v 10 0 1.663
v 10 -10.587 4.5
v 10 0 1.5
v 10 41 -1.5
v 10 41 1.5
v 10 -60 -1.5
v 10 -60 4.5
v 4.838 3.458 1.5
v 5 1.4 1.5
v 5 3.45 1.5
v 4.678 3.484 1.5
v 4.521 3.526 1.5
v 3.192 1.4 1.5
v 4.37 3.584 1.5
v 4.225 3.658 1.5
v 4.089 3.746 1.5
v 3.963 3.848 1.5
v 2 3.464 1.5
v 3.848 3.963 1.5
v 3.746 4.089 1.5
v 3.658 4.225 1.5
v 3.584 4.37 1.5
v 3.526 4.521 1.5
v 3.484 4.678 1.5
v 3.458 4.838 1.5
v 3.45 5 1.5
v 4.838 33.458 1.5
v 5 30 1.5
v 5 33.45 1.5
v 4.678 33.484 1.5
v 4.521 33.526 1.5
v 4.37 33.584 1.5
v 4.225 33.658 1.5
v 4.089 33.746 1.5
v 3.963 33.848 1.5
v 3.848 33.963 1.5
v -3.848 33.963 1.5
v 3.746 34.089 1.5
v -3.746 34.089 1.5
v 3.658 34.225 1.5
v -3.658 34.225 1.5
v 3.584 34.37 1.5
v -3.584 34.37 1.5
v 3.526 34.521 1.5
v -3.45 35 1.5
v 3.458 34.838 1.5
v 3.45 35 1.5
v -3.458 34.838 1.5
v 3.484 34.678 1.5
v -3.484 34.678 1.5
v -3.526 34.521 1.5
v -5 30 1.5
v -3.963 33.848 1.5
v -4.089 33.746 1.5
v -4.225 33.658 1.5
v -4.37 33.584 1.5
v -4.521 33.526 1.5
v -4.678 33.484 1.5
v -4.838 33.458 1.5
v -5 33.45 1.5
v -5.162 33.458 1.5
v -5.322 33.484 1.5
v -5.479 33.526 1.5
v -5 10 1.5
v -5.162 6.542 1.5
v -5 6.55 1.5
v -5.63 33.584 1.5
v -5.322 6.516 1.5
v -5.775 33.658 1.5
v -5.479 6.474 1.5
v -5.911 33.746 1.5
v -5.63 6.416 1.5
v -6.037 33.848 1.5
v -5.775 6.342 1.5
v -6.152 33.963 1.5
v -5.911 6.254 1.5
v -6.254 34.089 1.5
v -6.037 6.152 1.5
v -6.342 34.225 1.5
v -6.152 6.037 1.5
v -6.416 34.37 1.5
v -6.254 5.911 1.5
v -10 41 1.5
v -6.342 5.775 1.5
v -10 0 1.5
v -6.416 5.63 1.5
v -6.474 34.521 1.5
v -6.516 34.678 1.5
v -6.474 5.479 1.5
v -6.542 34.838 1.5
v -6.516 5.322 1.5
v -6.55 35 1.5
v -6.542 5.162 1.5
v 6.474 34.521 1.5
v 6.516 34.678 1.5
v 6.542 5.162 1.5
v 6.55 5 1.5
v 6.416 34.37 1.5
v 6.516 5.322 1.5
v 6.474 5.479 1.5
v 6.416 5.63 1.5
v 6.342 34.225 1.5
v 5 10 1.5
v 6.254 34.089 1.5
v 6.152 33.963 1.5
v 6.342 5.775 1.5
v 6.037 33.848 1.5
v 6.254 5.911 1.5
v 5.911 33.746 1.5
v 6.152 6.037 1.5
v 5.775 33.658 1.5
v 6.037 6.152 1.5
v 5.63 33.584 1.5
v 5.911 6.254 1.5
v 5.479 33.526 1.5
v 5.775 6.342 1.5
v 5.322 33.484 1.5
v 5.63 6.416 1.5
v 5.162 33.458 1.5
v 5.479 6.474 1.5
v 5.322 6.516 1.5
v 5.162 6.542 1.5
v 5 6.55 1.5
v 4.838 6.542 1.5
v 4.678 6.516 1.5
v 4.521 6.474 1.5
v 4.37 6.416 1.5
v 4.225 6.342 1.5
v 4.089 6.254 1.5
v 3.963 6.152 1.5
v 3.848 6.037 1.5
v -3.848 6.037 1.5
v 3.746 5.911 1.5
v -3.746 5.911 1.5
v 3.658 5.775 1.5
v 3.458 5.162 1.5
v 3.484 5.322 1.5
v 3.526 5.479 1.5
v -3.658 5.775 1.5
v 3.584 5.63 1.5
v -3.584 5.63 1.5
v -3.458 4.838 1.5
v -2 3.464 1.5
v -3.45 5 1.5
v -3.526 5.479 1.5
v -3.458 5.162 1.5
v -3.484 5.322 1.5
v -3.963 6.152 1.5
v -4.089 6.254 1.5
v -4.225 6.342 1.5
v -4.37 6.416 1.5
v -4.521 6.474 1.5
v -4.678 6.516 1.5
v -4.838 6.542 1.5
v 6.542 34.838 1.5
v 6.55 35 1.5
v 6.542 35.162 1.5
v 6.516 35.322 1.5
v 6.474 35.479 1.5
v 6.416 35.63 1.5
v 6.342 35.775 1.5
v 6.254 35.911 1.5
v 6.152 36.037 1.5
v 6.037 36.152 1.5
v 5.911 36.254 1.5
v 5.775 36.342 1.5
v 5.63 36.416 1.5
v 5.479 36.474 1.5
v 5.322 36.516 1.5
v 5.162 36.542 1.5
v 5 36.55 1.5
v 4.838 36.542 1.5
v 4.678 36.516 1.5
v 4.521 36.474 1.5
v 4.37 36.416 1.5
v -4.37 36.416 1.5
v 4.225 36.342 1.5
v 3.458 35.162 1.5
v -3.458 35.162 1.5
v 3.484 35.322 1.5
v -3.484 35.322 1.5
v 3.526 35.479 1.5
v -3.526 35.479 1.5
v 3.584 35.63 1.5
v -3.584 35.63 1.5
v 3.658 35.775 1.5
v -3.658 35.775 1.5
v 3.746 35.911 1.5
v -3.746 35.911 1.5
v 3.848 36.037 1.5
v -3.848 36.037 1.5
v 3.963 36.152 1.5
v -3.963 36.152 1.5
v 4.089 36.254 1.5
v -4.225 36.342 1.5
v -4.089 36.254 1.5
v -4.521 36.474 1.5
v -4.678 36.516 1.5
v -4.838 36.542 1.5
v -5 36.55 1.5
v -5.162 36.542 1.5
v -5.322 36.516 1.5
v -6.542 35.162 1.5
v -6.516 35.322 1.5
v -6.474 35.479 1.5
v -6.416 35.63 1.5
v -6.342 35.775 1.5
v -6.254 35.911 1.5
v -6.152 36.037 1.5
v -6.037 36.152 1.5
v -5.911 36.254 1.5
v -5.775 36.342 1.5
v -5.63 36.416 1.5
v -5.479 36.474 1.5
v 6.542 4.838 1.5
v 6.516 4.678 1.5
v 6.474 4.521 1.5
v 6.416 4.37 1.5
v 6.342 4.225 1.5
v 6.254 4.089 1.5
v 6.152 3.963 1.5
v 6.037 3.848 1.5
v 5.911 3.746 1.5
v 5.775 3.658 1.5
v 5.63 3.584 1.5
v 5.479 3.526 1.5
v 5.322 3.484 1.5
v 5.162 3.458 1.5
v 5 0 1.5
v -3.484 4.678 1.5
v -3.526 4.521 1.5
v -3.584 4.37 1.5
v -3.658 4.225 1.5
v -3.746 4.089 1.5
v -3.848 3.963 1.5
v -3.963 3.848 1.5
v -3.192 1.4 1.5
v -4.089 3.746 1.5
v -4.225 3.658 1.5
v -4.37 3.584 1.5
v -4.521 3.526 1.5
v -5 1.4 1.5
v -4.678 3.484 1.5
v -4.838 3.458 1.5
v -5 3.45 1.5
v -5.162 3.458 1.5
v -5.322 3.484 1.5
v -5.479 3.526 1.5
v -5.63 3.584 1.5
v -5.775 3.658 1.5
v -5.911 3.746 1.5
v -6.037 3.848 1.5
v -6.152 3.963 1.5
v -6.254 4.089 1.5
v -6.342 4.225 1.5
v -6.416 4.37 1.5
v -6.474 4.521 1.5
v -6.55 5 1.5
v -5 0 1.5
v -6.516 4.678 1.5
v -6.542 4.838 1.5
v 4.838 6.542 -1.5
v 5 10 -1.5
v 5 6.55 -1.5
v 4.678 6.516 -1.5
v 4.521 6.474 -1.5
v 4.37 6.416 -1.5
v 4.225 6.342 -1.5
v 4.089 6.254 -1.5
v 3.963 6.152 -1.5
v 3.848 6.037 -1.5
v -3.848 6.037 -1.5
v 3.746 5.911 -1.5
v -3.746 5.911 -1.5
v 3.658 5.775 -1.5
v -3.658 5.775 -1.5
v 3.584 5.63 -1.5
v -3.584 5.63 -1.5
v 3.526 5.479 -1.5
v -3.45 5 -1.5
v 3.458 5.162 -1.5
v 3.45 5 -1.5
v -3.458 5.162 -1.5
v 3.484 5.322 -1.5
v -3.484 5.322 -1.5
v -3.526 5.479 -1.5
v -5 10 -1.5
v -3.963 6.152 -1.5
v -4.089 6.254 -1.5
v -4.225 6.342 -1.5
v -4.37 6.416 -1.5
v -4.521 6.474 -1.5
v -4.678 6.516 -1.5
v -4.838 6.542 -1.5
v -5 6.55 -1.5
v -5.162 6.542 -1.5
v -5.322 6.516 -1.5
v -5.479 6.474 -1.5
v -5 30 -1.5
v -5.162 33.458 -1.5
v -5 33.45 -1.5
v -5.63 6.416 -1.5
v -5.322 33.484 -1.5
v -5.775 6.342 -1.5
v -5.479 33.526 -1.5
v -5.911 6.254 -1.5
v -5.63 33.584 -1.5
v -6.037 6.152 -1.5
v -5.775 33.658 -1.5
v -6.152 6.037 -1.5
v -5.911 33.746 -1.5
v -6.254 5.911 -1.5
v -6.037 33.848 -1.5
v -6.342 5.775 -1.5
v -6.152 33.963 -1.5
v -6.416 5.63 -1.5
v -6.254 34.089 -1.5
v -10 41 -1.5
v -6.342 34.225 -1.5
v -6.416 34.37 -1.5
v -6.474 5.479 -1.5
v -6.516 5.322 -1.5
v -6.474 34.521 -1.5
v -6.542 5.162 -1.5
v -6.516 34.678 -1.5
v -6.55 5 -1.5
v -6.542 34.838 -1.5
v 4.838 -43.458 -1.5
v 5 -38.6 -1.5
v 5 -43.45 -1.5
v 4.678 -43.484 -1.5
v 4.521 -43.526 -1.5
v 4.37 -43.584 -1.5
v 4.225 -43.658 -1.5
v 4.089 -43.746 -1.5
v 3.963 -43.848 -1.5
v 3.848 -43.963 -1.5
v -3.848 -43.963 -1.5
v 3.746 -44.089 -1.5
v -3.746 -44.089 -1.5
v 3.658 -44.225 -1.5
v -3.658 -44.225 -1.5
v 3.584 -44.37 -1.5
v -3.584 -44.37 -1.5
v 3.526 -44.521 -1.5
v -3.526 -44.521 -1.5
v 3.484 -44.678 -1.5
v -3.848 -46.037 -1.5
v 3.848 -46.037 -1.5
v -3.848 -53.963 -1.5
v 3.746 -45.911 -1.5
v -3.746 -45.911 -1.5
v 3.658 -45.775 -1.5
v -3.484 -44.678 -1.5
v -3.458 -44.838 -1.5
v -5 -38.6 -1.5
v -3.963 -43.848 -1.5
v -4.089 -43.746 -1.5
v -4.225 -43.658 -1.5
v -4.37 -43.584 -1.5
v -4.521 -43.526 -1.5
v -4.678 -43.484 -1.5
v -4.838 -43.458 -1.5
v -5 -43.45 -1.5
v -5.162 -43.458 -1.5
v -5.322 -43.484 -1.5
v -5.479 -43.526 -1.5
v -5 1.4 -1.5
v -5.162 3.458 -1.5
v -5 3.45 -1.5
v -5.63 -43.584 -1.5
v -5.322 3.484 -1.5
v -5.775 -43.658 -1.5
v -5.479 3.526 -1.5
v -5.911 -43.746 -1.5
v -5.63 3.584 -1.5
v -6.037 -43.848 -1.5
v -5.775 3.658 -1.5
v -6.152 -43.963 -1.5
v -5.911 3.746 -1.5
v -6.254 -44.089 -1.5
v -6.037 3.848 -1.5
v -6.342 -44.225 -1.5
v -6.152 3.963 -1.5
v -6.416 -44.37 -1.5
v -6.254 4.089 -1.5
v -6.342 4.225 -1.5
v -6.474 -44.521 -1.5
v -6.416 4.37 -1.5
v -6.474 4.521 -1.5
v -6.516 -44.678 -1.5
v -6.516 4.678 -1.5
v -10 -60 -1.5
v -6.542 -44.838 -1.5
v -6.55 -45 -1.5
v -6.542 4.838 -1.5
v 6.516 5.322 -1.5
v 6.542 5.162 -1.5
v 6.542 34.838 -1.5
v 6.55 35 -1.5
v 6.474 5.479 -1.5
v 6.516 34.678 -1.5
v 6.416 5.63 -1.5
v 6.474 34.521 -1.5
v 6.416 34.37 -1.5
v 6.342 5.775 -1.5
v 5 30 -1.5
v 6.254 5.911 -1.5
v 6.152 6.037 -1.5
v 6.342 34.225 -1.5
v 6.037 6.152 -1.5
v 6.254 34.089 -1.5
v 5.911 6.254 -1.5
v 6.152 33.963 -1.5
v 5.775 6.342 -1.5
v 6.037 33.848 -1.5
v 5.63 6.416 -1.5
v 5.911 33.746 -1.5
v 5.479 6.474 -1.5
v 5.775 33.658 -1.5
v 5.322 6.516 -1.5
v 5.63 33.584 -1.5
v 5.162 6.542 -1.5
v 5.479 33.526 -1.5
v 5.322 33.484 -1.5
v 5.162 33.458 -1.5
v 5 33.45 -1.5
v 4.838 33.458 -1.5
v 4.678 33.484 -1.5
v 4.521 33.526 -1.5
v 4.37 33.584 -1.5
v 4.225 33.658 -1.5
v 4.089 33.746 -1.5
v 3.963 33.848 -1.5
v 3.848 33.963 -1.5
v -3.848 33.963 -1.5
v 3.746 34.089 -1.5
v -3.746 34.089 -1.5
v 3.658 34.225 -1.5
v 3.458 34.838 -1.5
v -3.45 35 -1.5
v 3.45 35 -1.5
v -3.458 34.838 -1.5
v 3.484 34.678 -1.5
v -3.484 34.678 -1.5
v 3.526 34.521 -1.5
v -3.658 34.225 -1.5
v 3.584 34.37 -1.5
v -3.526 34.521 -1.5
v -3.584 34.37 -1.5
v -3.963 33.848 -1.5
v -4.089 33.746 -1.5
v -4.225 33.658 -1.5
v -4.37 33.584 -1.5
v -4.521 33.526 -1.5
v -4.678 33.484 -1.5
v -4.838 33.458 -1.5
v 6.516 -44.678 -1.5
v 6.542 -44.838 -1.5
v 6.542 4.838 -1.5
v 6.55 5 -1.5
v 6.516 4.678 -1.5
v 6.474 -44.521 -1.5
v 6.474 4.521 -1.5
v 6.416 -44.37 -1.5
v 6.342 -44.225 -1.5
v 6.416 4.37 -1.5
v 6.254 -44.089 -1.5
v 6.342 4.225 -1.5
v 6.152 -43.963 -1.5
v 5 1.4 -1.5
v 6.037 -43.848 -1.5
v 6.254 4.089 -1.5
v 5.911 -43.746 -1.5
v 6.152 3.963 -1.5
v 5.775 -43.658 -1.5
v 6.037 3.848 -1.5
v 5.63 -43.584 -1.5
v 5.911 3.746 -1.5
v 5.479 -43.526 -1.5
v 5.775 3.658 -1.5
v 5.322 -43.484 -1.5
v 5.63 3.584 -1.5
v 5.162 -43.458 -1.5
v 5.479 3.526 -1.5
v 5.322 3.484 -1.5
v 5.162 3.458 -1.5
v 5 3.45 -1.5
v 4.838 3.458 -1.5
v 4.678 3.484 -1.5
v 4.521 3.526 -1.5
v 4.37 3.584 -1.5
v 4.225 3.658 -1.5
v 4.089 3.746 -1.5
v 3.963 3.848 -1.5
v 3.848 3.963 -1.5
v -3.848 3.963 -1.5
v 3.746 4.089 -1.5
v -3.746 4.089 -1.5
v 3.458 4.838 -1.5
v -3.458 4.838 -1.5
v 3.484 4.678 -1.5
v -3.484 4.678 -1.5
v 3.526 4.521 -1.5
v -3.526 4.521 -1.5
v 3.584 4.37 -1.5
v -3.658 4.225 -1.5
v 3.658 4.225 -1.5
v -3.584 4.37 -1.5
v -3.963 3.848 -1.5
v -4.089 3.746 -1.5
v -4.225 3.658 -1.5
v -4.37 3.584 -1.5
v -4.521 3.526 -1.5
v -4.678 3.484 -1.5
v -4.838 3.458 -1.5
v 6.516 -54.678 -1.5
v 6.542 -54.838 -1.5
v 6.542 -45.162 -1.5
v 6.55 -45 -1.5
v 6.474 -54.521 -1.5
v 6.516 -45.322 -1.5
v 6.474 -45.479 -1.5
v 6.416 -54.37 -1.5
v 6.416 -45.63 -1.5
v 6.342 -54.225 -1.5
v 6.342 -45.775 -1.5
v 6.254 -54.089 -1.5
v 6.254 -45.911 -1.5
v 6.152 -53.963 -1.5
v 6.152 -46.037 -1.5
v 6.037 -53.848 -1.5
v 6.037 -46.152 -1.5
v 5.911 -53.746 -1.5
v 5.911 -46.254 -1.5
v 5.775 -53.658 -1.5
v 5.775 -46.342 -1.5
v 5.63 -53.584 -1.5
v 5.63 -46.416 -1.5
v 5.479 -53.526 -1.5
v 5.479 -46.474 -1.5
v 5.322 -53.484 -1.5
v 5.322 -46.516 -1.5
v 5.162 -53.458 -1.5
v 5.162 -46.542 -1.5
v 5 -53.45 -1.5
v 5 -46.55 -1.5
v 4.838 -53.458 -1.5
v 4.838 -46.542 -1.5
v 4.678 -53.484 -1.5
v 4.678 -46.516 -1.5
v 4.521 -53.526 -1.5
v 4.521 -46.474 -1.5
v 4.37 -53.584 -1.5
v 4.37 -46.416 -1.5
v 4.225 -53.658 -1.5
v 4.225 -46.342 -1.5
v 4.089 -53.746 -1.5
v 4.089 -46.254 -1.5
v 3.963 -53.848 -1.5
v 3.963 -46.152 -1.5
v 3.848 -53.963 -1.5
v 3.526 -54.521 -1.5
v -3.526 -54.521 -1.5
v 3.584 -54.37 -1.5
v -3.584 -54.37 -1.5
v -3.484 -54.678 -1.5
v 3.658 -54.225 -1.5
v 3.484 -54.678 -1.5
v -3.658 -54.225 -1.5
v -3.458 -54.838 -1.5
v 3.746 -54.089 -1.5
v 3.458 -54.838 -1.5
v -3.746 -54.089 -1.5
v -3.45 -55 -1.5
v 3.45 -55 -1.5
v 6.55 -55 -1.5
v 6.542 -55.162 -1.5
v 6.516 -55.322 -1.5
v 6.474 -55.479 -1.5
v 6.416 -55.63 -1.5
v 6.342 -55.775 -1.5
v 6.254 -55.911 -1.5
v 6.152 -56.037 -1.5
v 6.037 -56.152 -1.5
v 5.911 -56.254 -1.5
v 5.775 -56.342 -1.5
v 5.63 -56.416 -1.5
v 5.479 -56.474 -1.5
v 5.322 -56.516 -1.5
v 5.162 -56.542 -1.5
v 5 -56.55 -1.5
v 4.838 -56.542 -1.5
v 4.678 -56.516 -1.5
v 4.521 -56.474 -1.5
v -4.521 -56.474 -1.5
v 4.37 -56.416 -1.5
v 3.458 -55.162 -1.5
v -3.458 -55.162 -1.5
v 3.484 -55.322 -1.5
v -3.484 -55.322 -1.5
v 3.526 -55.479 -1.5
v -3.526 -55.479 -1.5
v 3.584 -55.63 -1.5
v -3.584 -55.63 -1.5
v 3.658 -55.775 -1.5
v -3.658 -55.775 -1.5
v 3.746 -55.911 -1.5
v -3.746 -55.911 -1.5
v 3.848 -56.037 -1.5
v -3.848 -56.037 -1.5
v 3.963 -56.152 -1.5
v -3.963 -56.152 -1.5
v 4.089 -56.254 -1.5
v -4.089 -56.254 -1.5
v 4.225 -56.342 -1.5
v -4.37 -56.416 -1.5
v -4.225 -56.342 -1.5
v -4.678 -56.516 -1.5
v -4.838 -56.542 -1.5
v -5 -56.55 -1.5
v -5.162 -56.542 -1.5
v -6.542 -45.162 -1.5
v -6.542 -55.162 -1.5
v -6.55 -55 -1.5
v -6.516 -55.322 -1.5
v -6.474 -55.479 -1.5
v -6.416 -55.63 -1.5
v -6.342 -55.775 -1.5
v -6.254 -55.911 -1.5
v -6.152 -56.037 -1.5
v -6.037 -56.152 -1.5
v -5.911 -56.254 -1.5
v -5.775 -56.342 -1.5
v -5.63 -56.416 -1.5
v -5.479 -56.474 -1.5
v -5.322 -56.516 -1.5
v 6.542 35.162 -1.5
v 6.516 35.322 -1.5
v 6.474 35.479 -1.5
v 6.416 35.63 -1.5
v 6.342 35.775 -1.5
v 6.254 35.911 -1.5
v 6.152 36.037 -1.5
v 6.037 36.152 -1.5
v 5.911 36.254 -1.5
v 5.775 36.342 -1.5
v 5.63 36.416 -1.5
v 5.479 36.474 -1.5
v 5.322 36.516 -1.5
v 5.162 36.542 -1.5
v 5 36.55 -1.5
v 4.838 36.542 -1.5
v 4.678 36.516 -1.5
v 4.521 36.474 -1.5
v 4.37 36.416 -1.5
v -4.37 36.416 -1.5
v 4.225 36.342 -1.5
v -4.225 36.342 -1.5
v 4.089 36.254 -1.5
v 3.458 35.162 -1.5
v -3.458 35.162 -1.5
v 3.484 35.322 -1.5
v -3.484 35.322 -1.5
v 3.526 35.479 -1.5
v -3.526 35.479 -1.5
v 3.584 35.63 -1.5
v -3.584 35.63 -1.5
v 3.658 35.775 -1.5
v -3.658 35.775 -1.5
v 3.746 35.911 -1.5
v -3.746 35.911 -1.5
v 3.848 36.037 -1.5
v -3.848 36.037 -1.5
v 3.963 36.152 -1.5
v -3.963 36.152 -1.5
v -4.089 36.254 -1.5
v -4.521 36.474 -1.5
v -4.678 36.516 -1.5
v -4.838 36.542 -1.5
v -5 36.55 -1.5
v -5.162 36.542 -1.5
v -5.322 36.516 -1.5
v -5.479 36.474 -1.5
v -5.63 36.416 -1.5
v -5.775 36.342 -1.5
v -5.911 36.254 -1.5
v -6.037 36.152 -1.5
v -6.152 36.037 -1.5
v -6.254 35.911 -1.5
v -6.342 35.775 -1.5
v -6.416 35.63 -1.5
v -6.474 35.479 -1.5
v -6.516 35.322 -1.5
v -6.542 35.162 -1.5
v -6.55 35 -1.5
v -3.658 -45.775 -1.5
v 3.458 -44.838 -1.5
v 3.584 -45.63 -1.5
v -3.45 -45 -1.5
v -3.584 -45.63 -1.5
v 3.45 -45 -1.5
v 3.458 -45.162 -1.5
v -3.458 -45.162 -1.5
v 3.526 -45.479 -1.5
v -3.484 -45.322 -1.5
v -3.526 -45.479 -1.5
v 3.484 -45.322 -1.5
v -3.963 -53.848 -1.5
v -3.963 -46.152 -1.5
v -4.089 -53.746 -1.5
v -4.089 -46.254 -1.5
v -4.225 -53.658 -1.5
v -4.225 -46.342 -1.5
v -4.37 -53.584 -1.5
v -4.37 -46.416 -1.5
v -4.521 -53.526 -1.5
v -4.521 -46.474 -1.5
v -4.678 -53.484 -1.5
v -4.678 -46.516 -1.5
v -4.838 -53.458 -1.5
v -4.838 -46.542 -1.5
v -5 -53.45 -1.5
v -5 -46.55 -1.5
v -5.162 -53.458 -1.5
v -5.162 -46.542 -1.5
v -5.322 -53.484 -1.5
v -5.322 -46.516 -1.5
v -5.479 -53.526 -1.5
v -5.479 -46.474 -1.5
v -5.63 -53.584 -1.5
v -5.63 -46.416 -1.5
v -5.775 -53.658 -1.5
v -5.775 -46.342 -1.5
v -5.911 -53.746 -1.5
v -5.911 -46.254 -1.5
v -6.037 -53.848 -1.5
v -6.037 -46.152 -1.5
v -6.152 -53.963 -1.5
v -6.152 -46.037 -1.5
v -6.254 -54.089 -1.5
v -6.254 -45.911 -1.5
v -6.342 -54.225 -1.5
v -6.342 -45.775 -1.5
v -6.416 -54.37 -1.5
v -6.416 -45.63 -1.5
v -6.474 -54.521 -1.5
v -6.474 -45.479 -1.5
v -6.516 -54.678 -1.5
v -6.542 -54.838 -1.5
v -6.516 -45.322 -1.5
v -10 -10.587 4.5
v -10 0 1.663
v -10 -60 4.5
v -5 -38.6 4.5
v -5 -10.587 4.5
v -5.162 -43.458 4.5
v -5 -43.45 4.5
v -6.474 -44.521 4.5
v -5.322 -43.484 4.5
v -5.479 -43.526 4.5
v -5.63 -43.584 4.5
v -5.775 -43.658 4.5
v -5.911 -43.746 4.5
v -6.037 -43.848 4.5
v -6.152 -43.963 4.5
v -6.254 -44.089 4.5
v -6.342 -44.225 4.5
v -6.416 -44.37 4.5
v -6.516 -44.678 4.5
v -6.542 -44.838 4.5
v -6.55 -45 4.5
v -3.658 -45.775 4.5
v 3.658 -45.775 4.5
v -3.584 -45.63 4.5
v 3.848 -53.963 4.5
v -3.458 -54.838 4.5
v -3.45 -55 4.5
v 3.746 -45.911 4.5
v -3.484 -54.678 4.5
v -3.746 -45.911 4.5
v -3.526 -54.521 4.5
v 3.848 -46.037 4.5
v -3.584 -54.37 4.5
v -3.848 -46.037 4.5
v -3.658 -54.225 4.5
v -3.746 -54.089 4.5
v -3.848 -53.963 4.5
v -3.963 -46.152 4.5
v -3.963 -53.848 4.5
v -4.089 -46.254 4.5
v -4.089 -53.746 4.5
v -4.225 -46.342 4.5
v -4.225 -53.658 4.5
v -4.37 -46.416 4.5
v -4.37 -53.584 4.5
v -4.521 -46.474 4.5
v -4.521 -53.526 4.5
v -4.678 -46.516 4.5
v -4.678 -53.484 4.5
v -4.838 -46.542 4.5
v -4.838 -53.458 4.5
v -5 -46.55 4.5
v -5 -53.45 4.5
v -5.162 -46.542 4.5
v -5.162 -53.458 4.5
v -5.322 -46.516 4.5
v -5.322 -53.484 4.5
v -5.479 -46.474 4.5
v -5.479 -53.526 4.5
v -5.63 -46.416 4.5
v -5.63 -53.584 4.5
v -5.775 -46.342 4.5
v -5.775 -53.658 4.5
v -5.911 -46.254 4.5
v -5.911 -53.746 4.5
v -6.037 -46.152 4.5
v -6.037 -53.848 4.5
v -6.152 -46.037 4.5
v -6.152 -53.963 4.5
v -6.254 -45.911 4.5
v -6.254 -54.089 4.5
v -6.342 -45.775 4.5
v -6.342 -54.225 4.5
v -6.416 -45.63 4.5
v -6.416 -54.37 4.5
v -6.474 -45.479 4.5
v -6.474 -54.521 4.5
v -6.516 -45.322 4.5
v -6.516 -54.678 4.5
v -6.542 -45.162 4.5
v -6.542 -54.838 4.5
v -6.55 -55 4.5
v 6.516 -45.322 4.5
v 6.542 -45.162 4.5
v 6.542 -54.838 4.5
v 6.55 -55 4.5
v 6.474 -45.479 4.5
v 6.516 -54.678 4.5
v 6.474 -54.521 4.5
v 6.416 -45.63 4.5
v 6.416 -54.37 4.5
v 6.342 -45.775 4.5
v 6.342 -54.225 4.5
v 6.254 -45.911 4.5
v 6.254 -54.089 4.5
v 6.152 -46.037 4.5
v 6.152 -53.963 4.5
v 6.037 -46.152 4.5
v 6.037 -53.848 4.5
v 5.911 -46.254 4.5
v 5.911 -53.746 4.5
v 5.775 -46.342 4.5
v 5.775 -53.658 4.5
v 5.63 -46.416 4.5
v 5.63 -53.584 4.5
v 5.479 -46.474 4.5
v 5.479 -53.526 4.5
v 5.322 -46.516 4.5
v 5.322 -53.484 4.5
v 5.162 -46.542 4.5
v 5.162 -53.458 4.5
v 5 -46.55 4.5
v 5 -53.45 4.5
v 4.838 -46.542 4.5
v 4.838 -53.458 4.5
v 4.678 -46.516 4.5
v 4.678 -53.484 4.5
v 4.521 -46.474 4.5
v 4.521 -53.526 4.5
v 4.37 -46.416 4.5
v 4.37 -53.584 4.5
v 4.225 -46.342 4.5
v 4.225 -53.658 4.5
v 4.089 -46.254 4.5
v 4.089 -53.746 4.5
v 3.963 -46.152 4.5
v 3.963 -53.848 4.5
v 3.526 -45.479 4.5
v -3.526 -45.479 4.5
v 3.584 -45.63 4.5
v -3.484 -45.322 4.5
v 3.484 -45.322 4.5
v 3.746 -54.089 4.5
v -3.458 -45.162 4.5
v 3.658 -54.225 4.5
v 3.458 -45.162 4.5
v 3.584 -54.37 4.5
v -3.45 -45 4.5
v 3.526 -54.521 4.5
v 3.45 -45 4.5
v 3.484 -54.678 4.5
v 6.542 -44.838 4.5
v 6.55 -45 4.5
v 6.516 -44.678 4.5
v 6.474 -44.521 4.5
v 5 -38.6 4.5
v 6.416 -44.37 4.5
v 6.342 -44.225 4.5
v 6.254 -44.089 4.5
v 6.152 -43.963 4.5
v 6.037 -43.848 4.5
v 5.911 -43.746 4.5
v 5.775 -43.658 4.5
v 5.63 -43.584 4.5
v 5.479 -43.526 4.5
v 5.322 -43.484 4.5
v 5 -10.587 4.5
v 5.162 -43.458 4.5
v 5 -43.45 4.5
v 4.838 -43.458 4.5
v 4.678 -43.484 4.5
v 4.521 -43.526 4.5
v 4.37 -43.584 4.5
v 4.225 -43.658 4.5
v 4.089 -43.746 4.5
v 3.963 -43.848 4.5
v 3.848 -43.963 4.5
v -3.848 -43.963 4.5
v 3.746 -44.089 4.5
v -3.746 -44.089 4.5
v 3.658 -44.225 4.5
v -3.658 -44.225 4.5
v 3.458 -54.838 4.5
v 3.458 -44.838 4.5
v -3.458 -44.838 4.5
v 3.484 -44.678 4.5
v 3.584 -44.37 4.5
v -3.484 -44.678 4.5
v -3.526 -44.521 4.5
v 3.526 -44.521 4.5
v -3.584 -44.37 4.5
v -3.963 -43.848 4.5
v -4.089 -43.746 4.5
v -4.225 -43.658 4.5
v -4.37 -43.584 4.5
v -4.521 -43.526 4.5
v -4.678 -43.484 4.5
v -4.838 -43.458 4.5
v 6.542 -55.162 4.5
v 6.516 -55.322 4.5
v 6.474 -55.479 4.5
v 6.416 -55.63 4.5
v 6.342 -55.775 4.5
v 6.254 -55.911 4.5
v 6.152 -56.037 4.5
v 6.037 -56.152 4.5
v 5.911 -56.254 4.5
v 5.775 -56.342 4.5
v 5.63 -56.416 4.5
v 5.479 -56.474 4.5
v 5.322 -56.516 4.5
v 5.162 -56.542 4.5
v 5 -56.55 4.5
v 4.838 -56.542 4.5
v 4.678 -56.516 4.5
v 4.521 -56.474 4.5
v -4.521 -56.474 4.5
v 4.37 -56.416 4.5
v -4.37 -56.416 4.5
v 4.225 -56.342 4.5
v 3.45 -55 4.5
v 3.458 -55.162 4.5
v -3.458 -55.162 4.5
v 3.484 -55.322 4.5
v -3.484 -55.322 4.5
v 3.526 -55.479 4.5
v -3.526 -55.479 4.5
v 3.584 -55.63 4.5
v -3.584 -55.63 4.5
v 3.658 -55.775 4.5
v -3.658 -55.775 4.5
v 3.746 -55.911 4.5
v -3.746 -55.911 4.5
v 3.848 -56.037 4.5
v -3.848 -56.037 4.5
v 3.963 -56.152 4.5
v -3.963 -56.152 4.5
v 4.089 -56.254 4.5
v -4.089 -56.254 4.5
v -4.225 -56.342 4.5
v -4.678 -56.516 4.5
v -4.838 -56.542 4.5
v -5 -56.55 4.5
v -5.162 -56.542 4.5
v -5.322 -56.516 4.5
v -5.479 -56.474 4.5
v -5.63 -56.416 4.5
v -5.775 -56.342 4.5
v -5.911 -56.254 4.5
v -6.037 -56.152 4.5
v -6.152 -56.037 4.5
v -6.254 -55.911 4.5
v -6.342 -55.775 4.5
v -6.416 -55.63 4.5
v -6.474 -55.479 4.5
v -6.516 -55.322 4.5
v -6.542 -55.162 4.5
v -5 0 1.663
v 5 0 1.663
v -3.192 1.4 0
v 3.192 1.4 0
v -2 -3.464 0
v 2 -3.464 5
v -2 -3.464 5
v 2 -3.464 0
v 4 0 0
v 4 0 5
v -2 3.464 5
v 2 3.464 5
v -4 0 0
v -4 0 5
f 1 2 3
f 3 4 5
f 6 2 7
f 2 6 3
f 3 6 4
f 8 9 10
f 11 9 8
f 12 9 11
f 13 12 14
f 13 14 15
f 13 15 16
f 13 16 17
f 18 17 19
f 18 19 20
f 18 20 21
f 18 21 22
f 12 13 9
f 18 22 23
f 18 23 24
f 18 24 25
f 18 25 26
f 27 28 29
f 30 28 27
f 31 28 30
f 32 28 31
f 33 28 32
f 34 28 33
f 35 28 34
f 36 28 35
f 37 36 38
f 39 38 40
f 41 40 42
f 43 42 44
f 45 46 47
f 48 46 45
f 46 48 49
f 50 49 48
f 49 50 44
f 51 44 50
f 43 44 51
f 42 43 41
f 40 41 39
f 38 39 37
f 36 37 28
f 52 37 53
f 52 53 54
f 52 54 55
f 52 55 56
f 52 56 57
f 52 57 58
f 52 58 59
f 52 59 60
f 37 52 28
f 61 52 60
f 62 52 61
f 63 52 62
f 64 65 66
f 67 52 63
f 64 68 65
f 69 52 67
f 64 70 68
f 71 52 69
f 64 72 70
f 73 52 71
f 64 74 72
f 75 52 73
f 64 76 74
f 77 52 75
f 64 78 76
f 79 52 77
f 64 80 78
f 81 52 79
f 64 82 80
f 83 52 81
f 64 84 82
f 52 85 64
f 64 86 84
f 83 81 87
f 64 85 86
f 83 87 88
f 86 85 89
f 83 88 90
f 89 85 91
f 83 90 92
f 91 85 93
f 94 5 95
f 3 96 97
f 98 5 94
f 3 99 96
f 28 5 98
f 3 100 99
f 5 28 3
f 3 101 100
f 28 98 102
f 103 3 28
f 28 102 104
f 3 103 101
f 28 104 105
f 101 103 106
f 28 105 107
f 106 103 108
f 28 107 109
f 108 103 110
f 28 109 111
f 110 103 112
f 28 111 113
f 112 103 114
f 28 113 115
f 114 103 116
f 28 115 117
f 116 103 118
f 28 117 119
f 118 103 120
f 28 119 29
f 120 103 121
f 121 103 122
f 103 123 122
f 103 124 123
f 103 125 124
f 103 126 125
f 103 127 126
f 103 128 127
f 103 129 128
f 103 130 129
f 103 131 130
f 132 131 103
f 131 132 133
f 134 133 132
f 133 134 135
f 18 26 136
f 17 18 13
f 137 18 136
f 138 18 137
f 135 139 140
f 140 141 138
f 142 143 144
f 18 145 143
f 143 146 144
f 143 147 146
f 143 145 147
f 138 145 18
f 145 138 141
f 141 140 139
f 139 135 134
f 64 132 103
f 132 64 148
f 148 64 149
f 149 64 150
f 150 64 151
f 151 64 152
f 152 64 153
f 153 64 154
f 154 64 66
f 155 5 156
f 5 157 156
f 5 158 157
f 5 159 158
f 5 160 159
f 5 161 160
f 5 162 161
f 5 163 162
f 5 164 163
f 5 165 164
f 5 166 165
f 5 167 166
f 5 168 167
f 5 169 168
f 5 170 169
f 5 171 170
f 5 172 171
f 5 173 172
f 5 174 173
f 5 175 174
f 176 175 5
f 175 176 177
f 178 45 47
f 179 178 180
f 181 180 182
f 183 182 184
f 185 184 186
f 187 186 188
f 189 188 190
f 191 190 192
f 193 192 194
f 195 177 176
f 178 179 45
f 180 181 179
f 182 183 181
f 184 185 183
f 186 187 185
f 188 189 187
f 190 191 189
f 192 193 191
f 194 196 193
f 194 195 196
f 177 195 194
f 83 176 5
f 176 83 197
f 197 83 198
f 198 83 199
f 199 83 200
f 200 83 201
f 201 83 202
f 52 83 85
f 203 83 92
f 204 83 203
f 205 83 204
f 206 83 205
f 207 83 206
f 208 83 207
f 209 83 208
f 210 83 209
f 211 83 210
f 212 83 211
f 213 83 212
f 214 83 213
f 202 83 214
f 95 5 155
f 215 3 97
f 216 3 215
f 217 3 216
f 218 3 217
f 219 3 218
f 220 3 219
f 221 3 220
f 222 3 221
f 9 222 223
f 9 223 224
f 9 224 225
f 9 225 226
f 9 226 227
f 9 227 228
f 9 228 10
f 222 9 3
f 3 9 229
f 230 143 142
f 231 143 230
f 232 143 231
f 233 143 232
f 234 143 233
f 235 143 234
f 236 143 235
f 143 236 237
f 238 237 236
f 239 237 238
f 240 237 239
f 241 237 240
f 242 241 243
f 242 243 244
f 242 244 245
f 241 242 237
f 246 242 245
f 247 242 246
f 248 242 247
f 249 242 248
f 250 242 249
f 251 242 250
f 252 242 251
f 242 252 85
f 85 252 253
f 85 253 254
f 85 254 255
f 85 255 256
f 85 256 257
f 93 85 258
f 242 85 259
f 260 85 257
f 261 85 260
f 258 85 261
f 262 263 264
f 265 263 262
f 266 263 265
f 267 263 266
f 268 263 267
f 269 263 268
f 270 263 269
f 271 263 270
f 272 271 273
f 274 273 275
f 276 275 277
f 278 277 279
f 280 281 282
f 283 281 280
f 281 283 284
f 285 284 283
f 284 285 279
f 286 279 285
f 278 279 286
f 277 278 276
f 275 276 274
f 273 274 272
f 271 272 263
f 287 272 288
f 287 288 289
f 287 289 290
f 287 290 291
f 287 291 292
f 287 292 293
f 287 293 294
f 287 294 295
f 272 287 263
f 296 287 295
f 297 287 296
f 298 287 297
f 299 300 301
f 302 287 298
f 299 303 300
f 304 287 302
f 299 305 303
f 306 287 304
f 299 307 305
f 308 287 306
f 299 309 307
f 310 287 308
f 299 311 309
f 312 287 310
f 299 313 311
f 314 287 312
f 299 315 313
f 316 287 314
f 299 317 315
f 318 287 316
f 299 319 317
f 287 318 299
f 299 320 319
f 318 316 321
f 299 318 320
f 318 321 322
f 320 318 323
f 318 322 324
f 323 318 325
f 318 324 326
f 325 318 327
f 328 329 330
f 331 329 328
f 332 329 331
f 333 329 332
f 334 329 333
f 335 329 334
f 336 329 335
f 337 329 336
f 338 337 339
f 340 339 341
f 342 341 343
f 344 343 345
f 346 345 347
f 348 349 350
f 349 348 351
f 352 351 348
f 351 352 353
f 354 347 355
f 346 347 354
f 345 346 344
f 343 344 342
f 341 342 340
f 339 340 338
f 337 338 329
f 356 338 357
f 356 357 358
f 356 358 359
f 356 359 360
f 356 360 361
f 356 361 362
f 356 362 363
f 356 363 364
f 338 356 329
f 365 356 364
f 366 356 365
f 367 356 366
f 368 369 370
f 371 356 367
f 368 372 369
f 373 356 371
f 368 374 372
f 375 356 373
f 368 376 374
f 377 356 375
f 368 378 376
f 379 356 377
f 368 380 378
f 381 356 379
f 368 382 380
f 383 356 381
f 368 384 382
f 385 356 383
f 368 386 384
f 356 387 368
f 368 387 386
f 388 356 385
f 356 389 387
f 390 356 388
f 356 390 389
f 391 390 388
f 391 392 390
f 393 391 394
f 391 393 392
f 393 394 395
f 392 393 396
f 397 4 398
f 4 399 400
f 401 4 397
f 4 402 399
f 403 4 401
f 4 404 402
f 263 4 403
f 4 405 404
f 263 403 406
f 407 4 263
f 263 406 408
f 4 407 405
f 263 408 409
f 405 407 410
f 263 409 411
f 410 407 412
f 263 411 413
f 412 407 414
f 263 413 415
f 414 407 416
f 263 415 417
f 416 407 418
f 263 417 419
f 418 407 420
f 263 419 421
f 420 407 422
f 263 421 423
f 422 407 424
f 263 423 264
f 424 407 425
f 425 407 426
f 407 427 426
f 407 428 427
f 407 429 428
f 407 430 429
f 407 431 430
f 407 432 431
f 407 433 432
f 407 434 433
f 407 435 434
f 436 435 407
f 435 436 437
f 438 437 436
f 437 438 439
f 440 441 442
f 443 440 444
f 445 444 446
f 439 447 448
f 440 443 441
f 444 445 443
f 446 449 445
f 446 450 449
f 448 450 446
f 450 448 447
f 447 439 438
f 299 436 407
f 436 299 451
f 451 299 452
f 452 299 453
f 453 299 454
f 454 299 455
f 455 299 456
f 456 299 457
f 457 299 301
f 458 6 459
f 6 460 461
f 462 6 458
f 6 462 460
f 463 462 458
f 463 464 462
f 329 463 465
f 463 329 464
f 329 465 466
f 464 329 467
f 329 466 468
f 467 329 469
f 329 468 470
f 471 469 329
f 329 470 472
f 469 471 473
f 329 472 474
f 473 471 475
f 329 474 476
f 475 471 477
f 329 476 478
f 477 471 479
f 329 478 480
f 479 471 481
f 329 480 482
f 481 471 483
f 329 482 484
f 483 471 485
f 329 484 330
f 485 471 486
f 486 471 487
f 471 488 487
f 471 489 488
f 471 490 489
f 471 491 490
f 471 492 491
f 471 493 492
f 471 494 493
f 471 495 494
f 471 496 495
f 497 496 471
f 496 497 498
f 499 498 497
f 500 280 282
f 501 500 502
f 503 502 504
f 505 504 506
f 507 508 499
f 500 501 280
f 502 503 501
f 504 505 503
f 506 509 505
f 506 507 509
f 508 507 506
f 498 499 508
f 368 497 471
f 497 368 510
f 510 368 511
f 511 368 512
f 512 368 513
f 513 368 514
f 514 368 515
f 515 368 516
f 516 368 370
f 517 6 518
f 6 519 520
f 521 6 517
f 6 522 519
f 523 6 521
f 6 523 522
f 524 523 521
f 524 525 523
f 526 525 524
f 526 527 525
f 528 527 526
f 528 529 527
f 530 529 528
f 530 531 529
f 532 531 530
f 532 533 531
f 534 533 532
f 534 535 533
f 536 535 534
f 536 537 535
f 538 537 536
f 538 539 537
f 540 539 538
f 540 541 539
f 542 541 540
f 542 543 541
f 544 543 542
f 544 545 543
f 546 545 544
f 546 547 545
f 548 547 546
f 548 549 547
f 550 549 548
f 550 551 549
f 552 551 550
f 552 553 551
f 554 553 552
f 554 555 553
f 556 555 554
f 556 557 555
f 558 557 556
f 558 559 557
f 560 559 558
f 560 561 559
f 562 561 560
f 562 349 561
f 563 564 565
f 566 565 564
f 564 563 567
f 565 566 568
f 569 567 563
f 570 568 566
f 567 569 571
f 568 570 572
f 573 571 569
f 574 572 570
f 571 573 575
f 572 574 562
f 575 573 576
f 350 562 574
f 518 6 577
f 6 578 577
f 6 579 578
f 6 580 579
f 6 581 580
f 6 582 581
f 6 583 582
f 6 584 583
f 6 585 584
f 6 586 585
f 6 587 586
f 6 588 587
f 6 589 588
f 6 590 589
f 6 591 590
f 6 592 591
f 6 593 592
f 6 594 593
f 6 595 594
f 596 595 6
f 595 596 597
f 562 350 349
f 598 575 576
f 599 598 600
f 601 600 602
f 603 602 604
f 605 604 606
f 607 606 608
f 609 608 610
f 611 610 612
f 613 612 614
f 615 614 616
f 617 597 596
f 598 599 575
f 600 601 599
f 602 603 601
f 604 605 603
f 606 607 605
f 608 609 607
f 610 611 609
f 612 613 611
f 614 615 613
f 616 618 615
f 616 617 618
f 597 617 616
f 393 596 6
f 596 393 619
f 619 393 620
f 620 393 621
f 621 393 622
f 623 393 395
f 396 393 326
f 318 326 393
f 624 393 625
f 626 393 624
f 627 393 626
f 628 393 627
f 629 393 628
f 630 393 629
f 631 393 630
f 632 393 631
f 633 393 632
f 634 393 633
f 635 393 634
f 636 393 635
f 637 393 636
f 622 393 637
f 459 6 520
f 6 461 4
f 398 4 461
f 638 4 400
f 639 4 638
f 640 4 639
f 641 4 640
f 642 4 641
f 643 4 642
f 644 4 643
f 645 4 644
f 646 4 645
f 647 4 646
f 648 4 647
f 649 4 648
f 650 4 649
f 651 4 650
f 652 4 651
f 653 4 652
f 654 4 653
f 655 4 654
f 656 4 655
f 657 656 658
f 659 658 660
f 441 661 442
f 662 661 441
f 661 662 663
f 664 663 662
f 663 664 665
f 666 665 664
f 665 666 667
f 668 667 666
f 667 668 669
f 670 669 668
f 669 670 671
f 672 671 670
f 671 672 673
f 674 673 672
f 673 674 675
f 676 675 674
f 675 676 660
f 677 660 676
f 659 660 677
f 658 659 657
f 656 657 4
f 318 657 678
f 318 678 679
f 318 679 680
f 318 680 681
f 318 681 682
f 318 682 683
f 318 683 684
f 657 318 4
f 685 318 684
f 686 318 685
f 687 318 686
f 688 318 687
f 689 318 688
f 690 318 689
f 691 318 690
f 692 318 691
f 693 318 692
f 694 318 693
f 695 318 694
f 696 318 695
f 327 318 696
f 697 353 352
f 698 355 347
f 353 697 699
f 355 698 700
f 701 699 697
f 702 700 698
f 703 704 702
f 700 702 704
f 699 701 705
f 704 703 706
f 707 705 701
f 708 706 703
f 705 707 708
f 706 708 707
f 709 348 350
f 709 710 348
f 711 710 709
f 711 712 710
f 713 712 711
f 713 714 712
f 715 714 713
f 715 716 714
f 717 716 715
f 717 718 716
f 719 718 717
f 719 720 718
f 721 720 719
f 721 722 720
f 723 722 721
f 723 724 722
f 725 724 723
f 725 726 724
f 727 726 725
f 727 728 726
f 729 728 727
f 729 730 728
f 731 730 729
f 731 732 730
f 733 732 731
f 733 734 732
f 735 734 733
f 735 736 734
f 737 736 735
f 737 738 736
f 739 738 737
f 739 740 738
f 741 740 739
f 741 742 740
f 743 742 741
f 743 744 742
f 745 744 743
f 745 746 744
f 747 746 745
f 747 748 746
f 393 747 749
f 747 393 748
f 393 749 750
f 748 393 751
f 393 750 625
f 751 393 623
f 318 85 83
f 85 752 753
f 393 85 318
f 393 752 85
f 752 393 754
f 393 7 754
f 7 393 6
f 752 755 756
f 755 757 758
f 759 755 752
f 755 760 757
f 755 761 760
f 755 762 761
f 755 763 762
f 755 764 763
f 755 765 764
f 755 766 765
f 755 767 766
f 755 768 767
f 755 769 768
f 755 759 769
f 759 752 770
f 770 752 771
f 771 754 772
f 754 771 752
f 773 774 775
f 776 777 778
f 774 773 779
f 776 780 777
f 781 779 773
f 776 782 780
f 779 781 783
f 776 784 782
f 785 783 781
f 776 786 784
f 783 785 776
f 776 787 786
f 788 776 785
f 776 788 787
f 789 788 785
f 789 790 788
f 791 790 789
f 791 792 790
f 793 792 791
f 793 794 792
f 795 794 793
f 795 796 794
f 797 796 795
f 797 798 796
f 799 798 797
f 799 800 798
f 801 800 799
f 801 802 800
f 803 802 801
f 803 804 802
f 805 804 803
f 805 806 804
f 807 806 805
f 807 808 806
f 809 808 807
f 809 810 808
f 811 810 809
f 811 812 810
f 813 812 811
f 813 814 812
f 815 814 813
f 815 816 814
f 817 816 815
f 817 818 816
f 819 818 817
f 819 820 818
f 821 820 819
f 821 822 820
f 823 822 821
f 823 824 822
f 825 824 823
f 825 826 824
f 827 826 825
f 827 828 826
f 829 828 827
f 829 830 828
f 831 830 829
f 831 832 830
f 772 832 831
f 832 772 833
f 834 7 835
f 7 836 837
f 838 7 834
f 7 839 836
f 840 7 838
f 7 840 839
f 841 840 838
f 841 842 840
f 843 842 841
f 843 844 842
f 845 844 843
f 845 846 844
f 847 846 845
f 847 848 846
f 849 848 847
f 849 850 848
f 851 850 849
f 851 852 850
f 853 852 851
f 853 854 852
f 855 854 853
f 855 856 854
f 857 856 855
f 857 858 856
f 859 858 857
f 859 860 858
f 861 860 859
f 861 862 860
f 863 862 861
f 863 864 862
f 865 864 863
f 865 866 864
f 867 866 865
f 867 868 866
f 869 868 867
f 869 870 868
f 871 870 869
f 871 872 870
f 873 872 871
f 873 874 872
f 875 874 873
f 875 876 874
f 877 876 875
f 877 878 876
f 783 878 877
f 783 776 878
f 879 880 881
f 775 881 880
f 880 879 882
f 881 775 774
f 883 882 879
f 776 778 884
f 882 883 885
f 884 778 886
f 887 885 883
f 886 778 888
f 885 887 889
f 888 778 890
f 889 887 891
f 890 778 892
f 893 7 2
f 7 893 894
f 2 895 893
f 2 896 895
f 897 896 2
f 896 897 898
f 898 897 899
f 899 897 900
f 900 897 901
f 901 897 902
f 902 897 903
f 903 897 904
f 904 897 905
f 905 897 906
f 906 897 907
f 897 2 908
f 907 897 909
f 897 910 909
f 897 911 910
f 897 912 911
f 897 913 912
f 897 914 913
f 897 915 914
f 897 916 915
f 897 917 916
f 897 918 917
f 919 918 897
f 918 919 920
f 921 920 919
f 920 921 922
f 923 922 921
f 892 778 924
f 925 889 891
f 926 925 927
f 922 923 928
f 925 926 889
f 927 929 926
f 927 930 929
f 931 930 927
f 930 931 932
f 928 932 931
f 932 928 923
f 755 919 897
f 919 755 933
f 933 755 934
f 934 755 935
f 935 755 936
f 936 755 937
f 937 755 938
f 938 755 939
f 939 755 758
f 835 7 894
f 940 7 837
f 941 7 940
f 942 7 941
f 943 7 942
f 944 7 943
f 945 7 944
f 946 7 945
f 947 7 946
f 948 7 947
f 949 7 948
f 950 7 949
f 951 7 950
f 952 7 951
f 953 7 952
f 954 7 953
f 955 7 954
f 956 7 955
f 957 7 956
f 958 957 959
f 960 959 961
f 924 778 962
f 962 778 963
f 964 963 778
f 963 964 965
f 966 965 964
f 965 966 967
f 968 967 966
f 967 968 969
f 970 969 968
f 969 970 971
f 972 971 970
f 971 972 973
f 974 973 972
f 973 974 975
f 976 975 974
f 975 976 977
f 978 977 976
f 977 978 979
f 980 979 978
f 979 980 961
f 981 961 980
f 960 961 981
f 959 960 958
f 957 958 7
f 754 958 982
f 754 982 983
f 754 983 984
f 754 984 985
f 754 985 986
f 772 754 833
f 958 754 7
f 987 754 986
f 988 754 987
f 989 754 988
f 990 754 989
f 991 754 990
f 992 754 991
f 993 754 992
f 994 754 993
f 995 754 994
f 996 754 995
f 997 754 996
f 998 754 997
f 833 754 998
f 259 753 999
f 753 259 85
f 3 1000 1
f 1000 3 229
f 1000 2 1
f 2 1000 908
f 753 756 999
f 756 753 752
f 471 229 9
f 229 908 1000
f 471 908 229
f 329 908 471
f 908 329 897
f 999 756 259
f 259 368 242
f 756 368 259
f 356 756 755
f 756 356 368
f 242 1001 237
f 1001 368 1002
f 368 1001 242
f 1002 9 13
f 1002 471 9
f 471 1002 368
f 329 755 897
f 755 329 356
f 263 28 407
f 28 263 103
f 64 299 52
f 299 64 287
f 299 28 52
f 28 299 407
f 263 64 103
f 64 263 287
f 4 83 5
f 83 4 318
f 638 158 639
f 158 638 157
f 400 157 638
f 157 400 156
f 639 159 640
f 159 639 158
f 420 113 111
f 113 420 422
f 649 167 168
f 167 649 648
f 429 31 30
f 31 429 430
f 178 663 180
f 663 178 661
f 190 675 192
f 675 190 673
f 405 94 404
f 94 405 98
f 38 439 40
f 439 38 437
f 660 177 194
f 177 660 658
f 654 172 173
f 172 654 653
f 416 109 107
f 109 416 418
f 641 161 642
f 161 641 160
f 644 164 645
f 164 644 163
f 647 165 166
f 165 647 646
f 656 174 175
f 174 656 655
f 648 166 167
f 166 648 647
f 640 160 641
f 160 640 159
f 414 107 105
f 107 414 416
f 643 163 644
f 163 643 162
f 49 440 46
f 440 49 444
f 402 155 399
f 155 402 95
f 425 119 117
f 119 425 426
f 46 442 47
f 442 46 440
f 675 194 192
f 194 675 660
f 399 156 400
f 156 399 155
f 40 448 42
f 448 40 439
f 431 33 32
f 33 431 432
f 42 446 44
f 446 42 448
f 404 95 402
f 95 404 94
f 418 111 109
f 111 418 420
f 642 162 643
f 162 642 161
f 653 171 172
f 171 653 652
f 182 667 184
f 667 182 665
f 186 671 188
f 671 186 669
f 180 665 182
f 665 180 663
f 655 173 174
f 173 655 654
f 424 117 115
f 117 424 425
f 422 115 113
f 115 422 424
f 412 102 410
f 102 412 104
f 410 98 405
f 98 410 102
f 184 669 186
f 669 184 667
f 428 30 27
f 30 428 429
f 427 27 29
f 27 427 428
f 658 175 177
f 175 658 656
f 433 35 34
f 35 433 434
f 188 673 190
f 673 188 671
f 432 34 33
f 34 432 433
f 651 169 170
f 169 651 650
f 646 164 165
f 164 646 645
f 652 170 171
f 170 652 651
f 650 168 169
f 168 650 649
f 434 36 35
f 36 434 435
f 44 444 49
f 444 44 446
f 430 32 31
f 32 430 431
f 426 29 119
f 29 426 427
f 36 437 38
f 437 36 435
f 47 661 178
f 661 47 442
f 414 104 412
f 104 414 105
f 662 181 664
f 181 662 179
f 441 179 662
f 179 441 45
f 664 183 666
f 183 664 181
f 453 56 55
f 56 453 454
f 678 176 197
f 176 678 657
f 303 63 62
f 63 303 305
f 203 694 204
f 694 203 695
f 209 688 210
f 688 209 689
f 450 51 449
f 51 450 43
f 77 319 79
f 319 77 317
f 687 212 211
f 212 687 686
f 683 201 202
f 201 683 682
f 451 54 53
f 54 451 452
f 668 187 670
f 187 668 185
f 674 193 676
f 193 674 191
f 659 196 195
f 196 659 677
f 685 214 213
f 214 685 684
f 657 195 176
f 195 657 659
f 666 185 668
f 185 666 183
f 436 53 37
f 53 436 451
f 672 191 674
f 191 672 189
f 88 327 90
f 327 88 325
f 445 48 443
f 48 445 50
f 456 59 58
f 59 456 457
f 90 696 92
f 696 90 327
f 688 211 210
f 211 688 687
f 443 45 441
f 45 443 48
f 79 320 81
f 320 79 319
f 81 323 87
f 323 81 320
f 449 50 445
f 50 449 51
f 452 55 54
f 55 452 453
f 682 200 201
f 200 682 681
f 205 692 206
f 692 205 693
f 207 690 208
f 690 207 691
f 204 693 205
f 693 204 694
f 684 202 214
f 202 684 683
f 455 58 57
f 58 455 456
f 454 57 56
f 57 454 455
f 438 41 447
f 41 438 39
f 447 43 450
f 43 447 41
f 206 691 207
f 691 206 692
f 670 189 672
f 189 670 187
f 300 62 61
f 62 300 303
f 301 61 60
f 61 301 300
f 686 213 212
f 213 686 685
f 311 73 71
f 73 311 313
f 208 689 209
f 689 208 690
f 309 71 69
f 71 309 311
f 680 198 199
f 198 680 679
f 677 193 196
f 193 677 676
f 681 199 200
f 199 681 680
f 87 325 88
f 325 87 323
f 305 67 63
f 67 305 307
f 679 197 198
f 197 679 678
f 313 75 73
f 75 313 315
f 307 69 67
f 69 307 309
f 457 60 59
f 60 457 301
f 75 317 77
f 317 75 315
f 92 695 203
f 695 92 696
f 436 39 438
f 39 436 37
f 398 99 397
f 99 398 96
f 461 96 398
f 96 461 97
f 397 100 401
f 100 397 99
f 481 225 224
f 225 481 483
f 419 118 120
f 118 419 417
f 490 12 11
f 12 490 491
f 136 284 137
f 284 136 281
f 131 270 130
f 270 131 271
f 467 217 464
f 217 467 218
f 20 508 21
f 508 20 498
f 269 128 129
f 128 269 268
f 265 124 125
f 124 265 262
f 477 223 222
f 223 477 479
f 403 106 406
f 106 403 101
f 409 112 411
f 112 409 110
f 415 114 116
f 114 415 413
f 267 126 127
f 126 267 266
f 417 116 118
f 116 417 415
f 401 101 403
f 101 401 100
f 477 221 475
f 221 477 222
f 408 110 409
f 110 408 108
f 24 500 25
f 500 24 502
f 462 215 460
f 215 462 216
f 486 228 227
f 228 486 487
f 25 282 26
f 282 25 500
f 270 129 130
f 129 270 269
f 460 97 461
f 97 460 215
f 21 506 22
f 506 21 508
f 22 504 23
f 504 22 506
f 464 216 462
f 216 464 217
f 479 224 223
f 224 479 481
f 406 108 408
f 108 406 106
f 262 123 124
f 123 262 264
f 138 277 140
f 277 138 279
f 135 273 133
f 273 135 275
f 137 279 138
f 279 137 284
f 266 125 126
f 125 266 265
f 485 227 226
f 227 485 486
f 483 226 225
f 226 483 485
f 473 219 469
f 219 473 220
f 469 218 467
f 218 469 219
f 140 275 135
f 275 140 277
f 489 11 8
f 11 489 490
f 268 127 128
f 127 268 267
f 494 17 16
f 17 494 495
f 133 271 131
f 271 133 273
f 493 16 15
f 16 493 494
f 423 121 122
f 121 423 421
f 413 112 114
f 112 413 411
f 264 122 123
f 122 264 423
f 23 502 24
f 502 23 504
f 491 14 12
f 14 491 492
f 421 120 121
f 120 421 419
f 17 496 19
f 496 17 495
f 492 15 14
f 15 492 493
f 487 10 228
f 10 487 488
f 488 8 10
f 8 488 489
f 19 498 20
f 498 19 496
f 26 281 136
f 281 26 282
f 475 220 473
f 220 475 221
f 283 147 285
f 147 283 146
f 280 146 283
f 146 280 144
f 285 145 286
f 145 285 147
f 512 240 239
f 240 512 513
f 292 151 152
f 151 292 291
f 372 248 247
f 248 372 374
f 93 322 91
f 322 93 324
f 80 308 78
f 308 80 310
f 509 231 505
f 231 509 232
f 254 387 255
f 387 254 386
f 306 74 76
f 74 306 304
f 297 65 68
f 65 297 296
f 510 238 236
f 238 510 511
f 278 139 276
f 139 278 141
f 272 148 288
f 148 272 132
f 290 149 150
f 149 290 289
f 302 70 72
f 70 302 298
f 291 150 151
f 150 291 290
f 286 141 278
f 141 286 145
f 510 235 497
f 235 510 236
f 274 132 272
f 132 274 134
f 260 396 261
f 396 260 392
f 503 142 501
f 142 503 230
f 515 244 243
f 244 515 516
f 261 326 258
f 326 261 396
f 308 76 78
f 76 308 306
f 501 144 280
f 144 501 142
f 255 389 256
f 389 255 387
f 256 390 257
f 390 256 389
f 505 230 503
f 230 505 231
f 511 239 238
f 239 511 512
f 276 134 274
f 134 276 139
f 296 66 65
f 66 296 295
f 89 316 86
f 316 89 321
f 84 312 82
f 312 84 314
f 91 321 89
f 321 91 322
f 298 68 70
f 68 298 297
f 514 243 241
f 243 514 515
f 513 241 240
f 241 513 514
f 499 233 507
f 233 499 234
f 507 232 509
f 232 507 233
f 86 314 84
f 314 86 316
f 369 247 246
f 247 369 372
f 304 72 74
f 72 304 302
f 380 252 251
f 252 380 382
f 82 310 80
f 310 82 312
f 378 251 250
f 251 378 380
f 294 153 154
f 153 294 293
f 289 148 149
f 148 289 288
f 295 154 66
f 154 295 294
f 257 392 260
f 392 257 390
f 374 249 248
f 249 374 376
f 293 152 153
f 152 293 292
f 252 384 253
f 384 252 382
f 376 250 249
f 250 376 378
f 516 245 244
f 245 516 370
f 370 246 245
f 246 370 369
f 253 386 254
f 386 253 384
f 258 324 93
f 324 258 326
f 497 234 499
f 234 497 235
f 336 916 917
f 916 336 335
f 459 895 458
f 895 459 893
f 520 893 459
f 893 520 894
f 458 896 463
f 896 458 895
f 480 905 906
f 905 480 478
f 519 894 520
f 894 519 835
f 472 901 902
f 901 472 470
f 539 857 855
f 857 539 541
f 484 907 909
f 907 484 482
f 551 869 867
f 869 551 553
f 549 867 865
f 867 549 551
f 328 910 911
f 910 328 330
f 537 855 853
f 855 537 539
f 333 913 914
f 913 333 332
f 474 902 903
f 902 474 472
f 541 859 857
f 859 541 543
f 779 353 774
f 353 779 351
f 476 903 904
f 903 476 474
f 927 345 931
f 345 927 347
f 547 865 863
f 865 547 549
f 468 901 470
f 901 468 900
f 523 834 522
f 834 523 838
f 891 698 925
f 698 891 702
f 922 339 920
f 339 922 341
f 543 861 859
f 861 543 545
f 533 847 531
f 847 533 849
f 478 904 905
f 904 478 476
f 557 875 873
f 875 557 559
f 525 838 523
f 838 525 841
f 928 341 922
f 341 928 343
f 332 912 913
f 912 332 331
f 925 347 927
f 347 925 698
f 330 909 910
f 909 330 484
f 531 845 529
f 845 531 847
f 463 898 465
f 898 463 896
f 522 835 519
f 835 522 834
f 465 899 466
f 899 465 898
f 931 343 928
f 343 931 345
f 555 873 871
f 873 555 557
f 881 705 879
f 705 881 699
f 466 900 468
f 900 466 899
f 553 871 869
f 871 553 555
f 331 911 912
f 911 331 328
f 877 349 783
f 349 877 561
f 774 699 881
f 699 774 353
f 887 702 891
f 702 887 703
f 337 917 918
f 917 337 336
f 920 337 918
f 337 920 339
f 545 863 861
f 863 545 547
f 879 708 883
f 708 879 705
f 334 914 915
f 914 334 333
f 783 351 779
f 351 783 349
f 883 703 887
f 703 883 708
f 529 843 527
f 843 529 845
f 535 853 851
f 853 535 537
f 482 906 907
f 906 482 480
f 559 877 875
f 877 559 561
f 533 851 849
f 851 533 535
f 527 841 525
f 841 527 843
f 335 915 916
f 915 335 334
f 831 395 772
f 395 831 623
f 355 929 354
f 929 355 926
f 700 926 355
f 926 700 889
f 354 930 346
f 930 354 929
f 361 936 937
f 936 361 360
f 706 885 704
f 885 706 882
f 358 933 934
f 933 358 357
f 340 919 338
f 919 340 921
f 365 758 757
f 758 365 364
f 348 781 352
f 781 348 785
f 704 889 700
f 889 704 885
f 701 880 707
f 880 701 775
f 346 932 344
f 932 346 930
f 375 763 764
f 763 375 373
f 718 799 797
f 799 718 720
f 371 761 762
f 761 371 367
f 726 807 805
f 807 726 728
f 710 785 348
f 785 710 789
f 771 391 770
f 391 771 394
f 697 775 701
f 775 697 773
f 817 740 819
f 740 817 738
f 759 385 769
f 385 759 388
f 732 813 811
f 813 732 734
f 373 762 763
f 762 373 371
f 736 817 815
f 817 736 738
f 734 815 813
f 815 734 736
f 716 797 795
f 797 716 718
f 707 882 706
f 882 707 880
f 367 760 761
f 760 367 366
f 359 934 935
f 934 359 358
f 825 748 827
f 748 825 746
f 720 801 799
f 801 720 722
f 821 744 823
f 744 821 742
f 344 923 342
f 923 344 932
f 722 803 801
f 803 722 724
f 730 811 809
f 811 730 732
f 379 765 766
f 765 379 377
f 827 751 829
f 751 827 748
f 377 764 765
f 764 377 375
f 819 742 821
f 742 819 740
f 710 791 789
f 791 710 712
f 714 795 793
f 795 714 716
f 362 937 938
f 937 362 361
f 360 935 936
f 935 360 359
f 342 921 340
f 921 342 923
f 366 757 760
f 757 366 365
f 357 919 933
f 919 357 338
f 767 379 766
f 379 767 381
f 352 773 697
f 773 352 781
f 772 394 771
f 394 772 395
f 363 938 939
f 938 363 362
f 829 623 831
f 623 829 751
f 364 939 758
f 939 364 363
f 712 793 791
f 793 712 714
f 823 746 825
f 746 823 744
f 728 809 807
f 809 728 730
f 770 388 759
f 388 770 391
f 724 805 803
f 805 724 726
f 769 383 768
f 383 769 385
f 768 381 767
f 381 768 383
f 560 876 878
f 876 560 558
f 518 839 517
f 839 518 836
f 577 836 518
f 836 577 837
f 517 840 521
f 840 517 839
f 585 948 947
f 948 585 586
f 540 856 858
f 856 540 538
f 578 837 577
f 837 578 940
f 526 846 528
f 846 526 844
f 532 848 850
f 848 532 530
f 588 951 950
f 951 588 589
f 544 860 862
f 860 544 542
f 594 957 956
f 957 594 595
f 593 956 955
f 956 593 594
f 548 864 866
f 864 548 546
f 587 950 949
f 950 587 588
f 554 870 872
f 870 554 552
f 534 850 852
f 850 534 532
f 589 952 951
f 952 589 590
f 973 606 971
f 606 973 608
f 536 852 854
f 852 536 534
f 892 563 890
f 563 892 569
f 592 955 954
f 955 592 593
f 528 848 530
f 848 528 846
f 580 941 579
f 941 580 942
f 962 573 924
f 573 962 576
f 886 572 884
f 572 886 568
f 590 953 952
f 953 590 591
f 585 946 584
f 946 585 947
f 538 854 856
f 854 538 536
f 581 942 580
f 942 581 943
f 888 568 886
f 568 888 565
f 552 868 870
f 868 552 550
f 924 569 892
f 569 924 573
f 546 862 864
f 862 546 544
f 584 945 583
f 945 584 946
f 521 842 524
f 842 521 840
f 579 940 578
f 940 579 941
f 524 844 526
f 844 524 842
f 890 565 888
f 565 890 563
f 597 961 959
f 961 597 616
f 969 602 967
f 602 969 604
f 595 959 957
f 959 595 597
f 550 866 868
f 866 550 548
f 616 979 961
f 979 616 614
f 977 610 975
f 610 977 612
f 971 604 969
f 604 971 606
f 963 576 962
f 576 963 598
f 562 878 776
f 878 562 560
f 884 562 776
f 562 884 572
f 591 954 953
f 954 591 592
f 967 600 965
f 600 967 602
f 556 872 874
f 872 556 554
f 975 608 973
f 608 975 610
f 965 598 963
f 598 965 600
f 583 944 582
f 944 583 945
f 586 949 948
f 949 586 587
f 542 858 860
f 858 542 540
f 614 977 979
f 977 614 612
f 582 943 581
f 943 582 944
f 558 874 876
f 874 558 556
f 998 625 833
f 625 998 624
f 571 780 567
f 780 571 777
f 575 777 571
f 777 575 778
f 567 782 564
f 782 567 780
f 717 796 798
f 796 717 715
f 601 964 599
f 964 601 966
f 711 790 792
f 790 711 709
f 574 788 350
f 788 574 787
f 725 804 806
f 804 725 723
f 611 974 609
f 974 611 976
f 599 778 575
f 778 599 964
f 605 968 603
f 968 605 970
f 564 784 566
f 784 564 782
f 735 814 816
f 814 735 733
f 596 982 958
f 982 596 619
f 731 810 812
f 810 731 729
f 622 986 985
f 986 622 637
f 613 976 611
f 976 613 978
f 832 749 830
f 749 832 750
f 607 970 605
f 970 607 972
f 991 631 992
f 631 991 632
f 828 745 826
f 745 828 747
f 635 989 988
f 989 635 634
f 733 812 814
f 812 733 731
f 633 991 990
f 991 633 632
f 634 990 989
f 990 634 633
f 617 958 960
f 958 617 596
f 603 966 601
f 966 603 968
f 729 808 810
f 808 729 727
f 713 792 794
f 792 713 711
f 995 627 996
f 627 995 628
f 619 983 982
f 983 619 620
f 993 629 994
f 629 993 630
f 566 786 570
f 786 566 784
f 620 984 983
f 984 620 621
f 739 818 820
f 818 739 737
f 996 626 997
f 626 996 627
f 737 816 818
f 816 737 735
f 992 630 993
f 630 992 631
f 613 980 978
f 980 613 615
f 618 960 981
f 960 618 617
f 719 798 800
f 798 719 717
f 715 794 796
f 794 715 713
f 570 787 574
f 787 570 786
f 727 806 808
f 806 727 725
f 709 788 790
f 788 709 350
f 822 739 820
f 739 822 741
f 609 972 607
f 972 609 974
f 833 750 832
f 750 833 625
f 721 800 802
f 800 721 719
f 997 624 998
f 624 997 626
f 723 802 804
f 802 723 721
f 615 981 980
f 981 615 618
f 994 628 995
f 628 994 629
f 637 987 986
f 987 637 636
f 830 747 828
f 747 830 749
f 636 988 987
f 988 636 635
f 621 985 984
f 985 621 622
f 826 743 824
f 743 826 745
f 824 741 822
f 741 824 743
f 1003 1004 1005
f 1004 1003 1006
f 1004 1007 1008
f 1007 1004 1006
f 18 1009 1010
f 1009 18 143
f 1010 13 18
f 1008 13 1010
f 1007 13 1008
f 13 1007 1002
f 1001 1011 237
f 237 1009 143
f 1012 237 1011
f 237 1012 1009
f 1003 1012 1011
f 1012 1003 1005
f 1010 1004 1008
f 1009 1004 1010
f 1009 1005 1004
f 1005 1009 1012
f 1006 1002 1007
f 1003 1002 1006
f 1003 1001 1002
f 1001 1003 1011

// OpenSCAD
width=20;
length=120;
thickness=3;
offset_center_b = 20;
offset_center_t = -50;

difference()
{
    union()
    {
        cube([width, length, thickness], center=true);
        translate([0,-length/4,thickness/2]){ cube([width, length/2, 2*thickness], center=true); }
    }
// bottom servo holes:
translate([5,offset_center_b+15,0]){ cylinder(d=3.1,h=thickness+2,center=true, $fn=60); }
translate([-5,offset_center_b+15,0]){ cylinder(d=3.1,h=thickness+2,center=true, $fn=60); }
translate([5,offset_center_b-15,0]){ cylinder(d=3.1,h=thickness+2,center=true, $fn=60); }
translate([-5,offset_center_b-15,0]){ cylinder(d=3.1,h=thickness+2,center=true, $fn=60); }

// top servo holes
translate([5,offset_center_t+5,thickness/2]){ cylinder(d=3.1,h=thickness*2+2,center=true, $fn=60); }
translate([-5,offset_center_t+5,thickness/2]){ cylinder(d=3.1,h=thickness*2+2,center=true, $fn=60); }
translate([5,offset_center_t-5,thickness/2]){ cylinder(d=3.1,h=thickness*2+2,center=true, $fn=60); }
translate([-5,offset_center_t-5,thickness/2]){ cylinder(d=3.1,h=thickness*2+2,center=true, $fn=60); }

// slope
color([1,0,0])
{ 
    translate([0,-0.93*length/6,thickness+0.26*length/6])
    {
        rotate([-15,0,0]){ cube([width+2,length/3,thickness], center=true); }
        cube([width/2,length/3,thickness*6+2], center=true);
    }
    translate([0,offset_center_b,0]){ cube([width/2,length/6,thickness+2], center=true); }
    translate([0,offset_center_b+length/4+1]){ cube([width+2,length/6,thickness+2], center=true); }
}
}

cylinder(d=8,h=5,$fn=6);
